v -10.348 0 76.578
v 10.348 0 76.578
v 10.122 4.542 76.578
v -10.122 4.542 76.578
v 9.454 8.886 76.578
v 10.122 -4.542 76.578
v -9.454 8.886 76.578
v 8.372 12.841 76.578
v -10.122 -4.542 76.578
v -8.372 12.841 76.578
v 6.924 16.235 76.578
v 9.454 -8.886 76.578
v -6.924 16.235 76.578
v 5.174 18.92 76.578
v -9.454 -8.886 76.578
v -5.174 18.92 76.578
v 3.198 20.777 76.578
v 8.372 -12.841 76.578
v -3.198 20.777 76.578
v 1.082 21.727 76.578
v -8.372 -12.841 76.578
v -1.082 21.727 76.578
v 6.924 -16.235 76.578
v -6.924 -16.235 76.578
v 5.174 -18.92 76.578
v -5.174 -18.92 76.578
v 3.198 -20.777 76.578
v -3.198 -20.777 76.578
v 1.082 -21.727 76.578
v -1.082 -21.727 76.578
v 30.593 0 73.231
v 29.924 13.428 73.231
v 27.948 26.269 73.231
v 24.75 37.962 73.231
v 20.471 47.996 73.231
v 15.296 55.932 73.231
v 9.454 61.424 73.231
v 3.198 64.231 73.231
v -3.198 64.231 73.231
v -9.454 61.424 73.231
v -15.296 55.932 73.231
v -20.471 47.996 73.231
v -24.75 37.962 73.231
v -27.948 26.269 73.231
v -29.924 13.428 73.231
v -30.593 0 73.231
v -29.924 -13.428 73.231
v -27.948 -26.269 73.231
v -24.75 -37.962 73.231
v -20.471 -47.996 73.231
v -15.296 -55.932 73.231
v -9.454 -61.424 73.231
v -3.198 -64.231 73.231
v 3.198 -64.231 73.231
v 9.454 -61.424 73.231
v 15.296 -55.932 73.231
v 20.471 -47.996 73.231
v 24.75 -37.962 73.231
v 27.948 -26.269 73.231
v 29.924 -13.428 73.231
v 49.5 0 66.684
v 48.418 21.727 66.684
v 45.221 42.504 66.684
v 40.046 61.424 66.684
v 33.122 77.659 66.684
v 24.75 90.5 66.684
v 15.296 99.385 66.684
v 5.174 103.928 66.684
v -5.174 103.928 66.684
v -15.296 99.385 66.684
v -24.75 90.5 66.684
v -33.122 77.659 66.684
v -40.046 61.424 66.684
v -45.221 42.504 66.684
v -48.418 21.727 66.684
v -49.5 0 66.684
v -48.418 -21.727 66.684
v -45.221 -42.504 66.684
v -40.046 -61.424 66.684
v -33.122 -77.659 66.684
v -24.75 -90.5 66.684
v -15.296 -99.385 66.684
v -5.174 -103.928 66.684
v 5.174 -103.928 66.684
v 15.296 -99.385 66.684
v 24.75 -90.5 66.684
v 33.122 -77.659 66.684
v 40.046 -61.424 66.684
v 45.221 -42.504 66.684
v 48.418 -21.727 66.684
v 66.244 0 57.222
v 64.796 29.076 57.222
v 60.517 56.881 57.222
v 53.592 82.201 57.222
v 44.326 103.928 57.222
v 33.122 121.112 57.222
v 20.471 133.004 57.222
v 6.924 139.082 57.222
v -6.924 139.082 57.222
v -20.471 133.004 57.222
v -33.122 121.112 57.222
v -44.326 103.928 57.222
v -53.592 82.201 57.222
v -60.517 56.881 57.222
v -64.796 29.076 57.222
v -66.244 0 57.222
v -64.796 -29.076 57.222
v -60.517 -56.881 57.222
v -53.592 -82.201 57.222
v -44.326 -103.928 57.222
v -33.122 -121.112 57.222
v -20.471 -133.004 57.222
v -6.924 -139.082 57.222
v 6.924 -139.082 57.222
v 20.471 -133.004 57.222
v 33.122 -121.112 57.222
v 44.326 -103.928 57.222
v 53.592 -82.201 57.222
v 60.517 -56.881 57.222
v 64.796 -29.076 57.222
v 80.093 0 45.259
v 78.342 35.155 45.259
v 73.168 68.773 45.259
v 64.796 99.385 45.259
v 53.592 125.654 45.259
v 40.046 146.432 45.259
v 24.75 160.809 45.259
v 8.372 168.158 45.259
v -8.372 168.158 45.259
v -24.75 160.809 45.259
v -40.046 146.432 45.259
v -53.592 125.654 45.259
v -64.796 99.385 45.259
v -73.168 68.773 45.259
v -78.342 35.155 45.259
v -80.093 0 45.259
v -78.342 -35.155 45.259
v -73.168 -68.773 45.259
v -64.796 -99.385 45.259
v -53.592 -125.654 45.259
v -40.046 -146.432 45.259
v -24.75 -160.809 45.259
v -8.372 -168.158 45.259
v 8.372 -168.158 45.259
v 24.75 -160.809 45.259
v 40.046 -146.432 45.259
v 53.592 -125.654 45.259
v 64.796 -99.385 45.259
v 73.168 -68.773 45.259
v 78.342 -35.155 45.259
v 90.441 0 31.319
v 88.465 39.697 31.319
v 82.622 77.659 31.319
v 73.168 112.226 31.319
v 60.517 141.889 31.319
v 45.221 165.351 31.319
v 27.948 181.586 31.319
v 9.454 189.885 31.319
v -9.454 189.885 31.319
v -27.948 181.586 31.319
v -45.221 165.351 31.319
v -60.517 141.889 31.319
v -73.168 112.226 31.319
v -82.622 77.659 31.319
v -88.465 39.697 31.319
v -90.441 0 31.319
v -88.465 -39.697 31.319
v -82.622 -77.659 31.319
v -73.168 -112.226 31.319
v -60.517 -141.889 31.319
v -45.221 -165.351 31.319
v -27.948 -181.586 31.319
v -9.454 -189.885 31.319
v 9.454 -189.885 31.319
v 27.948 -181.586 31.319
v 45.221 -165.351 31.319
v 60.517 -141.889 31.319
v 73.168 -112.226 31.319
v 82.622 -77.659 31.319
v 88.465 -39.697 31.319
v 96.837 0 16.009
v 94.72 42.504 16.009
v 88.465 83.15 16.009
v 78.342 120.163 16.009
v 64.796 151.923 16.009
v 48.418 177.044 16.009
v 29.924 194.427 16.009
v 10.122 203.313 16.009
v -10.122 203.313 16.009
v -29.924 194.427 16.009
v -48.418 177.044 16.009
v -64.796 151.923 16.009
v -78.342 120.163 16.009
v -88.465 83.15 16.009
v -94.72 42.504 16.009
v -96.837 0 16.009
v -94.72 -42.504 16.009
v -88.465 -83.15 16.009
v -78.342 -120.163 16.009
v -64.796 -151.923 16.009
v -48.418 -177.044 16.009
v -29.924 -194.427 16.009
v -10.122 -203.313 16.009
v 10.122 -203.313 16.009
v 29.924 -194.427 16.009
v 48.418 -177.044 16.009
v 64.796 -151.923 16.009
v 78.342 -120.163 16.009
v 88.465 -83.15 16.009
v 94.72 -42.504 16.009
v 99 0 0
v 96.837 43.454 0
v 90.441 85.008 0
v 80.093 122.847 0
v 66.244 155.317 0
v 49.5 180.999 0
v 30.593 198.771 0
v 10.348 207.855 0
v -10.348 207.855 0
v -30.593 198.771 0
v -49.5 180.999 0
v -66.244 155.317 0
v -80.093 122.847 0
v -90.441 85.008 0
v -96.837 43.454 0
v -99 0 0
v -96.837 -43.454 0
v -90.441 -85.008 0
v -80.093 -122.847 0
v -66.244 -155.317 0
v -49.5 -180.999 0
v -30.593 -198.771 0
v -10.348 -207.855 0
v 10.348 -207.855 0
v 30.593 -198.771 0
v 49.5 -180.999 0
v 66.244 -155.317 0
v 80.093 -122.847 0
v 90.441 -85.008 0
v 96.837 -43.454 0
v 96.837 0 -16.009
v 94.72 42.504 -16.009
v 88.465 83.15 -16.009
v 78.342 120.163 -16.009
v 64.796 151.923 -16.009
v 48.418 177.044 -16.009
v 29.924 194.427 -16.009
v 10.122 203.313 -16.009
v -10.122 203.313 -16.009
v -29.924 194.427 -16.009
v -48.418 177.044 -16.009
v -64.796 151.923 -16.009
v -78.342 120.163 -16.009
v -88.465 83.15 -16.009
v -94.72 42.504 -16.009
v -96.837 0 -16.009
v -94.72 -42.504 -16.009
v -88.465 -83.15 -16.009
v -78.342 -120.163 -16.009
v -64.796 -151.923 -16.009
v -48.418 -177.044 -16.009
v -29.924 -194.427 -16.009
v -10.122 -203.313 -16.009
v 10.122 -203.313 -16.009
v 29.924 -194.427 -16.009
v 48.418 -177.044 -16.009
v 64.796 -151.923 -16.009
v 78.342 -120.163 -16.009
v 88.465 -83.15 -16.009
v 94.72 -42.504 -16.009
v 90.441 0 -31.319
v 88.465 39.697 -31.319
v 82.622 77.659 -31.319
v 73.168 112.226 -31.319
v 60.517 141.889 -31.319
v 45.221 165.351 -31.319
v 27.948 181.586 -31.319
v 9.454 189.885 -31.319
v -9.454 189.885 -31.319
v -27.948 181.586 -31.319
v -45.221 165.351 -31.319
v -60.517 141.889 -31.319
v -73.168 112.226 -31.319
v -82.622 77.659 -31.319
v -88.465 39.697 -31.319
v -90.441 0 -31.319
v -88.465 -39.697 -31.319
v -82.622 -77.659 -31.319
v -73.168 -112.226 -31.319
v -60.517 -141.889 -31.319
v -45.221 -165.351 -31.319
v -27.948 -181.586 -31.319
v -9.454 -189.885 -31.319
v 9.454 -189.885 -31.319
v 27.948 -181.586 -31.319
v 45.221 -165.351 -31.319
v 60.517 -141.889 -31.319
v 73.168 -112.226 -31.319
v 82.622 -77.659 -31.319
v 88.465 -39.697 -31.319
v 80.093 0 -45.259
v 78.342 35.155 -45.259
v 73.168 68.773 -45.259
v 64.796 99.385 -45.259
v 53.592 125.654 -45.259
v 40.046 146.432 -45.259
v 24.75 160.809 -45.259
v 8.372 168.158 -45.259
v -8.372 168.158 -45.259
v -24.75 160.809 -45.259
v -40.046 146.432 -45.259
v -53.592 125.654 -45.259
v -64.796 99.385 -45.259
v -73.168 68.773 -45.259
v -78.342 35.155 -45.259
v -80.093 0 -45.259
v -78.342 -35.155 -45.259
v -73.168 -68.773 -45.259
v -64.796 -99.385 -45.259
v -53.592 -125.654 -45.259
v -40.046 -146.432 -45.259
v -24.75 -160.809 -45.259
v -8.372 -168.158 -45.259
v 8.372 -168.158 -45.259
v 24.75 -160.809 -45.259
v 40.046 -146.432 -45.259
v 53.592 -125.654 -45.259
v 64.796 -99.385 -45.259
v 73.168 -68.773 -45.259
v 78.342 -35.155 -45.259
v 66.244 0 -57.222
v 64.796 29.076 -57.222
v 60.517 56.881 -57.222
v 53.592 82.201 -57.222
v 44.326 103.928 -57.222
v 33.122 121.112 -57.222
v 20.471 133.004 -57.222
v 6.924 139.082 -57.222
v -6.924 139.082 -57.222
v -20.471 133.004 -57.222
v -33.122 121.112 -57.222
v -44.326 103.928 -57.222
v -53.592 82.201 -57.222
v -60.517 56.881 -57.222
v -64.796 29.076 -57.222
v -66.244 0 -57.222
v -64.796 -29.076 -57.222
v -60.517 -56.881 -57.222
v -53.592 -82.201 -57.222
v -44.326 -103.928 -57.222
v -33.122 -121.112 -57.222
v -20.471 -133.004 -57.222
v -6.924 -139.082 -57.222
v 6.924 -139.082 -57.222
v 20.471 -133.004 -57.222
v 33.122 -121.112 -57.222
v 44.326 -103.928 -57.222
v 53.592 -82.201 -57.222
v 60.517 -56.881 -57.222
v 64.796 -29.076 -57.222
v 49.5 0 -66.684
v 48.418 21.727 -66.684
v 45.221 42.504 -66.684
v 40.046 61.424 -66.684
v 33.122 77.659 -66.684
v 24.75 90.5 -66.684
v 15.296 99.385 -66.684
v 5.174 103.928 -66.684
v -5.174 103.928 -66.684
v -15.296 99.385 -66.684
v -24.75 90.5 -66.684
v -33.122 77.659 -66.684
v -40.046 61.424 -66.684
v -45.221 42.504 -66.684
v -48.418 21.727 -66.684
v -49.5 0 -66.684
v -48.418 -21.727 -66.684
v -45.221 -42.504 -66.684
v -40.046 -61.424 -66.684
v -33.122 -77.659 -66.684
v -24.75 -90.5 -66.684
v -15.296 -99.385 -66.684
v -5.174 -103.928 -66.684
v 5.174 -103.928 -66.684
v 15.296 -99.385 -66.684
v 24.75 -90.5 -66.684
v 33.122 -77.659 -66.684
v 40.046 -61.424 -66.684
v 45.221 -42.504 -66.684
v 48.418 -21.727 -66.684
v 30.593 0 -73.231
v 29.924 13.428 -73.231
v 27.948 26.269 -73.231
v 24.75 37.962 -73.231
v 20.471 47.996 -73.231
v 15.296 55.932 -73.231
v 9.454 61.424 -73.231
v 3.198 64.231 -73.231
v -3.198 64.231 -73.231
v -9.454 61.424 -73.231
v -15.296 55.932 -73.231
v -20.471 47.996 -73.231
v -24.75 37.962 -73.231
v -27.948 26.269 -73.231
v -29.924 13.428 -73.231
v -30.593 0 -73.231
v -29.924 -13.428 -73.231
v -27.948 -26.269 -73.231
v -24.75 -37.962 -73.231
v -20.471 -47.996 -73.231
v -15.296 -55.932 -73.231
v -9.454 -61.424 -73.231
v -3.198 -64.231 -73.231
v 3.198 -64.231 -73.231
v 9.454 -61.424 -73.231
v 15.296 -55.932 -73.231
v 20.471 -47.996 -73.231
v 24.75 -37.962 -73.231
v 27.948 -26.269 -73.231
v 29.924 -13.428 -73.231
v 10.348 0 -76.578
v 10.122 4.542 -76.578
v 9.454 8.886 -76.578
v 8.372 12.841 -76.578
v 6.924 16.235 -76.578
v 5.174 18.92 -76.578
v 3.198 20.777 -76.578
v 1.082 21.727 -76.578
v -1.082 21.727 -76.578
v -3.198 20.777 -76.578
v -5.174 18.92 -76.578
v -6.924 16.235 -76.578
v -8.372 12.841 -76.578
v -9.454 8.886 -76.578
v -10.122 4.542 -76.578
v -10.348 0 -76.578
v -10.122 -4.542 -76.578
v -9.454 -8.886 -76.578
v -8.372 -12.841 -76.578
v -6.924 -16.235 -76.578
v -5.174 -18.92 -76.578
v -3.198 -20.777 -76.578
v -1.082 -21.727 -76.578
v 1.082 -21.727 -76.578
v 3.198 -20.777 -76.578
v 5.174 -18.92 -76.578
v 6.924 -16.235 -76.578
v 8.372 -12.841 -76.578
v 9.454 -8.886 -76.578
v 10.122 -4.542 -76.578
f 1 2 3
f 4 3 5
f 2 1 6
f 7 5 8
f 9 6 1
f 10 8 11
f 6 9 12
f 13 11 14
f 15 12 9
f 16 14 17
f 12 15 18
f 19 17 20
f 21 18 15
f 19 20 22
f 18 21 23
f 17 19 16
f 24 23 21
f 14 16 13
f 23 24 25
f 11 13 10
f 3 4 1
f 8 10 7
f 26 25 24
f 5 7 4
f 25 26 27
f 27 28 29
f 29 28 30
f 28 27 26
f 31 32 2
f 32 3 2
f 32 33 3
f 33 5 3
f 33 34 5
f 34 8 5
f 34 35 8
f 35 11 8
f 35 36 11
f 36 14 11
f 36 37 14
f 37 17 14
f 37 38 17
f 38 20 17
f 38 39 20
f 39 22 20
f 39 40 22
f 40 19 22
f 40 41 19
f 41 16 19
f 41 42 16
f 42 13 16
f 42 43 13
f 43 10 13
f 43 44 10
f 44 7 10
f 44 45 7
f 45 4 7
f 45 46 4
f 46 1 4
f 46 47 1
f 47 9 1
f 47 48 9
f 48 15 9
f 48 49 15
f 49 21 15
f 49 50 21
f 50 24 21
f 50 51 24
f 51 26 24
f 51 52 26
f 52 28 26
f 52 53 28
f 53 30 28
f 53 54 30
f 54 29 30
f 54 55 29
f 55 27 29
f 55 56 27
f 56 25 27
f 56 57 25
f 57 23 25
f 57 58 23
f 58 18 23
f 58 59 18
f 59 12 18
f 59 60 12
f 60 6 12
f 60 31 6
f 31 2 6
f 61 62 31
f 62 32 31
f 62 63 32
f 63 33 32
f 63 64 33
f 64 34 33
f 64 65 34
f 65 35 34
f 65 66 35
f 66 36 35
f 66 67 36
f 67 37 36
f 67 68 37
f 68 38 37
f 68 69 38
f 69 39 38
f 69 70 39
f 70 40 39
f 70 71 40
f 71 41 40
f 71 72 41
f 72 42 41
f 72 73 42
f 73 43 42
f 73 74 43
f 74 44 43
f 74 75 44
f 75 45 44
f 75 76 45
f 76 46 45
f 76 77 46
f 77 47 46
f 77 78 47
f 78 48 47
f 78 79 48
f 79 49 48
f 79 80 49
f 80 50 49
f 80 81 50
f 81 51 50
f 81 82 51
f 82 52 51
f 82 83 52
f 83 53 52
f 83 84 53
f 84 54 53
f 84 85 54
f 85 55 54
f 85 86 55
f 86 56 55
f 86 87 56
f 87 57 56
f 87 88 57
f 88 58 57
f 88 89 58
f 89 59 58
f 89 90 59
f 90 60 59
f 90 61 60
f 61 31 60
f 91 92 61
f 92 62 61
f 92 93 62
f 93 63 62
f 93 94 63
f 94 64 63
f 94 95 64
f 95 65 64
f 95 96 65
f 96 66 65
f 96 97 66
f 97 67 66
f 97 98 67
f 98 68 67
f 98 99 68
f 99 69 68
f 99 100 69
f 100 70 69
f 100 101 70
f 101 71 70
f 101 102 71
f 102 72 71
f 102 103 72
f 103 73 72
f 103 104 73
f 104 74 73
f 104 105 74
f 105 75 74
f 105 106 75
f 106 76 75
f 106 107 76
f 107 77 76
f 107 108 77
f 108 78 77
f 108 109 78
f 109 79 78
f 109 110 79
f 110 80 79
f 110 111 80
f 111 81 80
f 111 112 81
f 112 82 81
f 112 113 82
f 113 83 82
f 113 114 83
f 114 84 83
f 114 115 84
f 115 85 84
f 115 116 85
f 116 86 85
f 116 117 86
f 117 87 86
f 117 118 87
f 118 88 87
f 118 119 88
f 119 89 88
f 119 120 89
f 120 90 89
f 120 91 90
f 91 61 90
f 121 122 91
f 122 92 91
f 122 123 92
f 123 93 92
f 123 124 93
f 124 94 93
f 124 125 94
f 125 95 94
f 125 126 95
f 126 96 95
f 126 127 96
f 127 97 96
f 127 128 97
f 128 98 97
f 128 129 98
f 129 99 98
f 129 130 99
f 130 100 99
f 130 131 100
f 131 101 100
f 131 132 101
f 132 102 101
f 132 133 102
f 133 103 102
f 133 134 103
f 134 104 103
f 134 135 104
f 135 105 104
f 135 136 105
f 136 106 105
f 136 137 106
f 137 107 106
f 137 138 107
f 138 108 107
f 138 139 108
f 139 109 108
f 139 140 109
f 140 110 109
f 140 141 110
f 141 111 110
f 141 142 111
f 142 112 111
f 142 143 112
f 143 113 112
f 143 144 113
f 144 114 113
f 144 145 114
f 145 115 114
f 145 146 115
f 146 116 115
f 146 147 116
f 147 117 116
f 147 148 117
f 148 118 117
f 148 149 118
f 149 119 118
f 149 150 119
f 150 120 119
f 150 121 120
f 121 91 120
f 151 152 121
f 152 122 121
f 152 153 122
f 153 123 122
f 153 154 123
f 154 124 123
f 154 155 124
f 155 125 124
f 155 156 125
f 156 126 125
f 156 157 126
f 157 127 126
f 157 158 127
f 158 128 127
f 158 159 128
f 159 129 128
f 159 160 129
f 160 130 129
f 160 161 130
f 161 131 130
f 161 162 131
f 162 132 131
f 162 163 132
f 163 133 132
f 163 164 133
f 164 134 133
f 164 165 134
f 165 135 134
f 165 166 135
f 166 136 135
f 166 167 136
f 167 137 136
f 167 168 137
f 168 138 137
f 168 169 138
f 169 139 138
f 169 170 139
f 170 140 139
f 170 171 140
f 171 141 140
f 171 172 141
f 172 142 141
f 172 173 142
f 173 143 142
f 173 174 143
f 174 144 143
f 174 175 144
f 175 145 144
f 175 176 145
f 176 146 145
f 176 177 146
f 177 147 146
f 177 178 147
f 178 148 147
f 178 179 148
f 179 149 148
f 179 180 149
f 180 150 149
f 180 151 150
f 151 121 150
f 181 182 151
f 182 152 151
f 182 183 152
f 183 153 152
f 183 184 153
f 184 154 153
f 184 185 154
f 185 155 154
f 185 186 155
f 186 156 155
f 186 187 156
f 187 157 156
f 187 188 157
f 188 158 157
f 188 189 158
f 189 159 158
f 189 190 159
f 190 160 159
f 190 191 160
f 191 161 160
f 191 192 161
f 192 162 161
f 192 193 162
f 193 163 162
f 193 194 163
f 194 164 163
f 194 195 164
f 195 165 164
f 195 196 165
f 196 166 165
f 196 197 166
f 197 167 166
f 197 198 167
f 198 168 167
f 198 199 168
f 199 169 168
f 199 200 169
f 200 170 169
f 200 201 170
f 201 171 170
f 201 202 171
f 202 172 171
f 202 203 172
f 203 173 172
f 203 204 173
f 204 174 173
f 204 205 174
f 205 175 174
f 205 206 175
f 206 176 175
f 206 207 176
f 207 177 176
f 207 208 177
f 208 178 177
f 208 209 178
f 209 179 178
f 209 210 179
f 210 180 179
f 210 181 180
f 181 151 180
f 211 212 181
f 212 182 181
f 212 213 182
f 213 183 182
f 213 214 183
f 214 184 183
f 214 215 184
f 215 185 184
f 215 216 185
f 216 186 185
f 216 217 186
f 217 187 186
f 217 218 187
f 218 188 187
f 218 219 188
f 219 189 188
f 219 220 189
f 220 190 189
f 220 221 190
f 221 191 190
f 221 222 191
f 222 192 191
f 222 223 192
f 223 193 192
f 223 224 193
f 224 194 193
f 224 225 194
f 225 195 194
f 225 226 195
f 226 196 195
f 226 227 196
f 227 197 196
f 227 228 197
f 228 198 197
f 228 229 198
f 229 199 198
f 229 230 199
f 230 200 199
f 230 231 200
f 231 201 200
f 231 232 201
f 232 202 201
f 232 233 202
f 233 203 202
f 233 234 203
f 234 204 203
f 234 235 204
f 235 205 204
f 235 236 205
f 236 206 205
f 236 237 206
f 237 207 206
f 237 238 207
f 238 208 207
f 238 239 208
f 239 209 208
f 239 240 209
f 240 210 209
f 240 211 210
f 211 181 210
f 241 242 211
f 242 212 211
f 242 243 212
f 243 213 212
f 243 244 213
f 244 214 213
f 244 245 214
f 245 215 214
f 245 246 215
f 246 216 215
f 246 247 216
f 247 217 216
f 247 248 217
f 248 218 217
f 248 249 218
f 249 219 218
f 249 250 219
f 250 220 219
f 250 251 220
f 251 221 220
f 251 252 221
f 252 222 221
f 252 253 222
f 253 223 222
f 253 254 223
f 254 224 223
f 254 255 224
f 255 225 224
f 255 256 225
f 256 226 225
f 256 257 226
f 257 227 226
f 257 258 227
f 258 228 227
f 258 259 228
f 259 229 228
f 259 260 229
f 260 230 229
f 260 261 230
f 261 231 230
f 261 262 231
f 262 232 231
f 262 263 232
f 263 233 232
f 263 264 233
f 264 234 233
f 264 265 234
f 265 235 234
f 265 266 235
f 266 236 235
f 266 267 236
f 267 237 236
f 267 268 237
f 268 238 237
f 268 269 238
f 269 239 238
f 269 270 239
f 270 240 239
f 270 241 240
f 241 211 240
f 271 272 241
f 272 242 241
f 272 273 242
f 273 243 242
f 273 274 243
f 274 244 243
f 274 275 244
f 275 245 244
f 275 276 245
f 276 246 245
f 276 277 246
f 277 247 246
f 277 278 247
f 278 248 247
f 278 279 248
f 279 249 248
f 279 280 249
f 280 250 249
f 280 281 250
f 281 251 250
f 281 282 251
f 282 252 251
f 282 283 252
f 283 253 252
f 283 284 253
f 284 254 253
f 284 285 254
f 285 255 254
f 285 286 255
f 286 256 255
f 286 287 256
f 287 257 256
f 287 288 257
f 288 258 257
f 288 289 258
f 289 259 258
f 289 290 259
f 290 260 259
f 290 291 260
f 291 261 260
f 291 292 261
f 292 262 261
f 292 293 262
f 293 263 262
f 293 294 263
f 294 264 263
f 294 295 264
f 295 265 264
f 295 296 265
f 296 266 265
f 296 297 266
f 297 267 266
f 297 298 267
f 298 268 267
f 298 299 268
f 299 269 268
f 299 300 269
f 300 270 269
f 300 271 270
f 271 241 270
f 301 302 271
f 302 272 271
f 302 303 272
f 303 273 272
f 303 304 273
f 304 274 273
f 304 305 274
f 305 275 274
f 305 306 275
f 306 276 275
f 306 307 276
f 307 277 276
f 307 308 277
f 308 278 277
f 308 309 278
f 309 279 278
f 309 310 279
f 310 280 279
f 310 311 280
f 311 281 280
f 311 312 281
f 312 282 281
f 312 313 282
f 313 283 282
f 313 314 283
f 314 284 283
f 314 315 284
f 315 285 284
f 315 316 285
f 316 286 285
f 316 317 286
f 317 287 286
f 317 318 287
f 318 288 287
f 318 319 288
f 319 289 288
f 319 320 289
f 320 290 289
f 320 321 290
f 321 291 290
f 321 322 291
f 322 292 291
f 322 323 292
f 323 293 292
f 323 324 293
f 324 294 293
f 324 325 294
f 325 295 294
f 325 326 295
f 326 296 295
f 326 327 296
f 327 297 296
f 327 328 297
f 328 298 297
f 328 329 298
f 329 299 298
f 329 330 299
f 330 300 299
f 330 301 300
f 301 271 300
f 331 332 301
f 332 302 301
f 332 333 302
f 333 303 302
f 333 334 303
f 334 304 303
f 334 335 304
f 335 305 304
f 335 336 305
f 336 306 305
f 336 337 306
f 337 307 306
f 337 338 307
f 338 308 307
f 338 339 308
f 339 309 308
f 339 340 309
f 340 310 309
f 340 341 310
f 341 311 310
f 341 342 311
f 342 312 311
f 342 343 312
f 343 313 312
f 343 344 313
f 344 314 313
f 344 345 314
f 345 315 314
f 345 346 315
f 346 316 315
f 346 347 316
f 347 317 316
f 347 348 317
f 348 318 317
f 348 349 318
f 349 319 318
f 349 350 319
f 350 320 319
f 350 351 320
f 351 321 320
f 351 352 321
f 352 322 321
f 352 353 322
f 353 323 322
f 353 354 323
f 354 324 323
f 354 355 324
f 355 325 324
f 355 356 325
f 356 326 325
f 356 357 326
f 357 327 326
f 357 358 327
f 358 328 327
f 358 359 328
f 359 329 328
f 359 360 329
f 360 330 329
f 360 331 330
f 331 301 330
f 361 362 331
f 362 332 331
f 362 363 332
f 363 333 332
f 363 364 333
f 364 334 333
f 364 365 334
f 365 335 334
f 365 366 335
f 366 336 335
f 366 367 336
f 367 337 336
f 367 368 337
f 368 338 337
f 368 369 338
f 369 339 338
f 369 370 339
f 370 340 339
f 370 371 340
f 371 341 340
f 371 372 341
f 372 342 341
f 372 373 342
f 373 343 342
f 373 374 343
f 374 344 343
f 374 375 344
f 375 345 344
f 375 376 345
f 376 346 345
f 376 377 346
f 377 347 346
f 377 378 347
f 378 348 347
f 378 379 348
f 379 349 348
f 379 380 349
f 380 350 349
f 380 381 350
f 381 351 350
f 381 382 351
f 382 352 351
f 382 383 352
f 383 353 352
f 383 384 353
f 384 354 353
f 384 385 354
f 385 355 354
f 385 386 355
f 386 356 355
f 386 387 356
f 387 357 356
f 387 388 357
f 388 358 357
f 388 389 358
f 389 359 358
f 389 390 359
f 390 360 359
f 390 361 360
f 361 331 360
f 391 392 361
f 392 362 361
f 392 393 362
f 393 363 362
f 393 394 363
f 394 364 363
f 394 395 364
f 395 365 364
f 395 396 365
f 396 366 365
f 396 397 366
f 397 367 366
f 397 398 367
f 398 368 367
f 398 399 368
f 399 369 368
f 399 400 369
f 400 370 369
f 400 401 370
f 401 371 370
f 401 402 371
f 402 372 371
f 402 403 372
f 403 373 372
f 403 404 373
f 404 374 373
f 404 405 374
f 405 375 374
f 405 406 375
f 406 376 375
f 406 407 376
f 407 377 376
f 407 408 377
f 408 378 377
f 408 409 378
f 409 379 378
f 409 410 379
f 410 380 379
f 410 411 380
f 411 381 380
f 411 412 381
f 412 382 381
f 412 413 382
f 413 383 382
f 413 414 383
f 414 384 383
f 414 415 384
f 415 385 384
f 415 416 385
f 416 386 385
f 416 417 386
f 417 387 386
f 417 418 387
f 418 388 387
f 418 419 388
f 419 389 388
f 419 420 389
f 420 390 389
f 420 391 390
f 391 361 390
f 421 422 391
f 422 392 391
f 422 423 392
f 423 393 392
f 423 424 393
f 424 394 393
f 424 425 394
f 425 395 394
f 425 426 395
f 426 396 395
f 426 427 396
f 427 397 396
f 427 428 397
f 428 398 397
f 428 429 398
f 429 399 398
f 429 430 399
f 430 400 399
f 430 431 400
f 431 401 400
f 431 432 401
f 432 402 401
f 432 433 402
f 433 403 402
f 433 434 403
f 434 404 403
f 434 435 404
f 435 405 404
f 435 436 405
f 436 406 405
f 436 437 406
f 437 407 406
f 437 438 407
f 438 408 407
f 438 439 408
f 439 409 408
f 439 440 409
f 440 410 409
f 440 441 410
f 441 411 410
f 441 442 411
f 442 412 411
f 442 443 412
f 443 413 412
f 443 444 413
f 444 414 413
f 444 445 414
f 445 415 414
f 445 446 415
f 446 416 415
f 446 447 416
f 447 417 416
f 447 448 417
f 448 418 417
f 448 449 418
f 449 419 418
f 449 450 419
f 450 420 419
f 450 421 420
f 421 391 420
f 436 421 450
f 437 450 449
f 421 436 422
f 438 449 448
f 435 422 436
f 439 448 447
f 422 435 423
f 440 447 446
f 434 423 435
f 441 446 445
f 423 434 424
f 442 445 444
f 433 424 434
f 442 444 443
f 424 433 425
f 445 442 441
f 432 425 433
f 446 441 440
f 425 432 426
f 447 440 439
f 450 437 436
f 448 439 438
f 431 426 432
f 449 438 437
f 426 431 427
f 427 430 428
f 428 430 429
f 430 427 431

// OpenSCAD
// Generated by SolidPython 1.0.1 on 2020-07-29 00:46:49


scale(v = [9, 19, 7]) {
	sphere(r = 11);
}
/***********************************************
*********      SolidPython code:      **********
************************************************
 
# import packages: SolidPython
from solid import *
from solid.utils import *
from itertools import chain, combinations, permutations


class Resize:

    def __init__(self, scad_file):
        self.scad_file = scad_file
        #self.scad_file = import_scad(scad_file)
        # cone/cylinder param:
        self.r1 = 0
        self.r2 = 0
        self.h = 0
        # rectangular prism param:
        self.w = 0
        self.l = 0
        # ellipse param:
        self.r = 0

    # import OpenScad code (file name corresponds to shape)


    # classify shape + parameters
    def assign(self, param1, param2, param3):
        if self.scad_file == 'cone.scad':
            self.r1 = param1
            self.r2 = param2
            self.h = param3
        elif self.scad_file == 'cylinder.scad':
            self.r1 = param1
            self.r2 = param2
            self.h = param3
        elif self.scad_file == 'rectangularPrism.scad':
            self.h = param1
            self.l = param2
            self.w = param3
        else:
            self.r = param1
            self.h = param2

    # resize parameters
    def iterate(self):
        x = range(3, 20, 2)
        i = 1
        if self.scad_file == 'cone.scad':
            tempList = list(permutations(x, 2))
            for temp in tempList:
                param1 = temp[0]
                param2 = temp[1]
                filepath = 'produced_scad_files/' + 'cone' + str(param1) + '_' + str(param2) + '_' + '.scad'
                scad_render_to_file(cylinder(h=param1, r1=param2, r2=0), filepath)

        elif self.scad_file == 'cylinder.scad':
            tempList = list(permutations(x, 3))
            for temp in tempList:
                param1 = temp[0]
                param2 = temp[1]
                filepath = 'produced_scad_files/' + 'cylinder' + str(param1) + '_' + str(param2) + '_' + '.scad'
                scad_render_to_file(cylinder(h=param1, r1=param2, r2=param2), filepath)

        elif self.scad_file == 'rectangularPrism.scad':
            tempList = list(permutations(x, 3))
            for temp in tempList:
                param1 = temp[0]
                param2 = temp[1]
                param3 = temp[2]
                filepath = 'produced_scad_files/' + 'rectangularPrism' + str(param1) + '_' + str(param2) + '_' + str(
                    param3) + '.scad'
                scad_render_to_file(cube(size=(param1, param2, param3)), filepath)

        elif self.scad_file == 'ellipse.scad':
            tempList = list(permutations(x, 4))
            for temp in tempList:
                param1 = temp[0]
                param2 = temp[1]
                param3 = temp[2]
                param4 = temp[3]
                filepath = 'produced_scad_files/' + 'ellipse' + str(param1) + '_' + str(param2) + '_' + str(param3) + '_' + str(param4) + '.scad'
                scad_render_to_file(scale([param1, param2, param3])(sphere(r=param4)), filepath)

    def render_to_scadfile(self):
        scad_render_to_file(scad, 'example.scad') 
 
************************************************/
